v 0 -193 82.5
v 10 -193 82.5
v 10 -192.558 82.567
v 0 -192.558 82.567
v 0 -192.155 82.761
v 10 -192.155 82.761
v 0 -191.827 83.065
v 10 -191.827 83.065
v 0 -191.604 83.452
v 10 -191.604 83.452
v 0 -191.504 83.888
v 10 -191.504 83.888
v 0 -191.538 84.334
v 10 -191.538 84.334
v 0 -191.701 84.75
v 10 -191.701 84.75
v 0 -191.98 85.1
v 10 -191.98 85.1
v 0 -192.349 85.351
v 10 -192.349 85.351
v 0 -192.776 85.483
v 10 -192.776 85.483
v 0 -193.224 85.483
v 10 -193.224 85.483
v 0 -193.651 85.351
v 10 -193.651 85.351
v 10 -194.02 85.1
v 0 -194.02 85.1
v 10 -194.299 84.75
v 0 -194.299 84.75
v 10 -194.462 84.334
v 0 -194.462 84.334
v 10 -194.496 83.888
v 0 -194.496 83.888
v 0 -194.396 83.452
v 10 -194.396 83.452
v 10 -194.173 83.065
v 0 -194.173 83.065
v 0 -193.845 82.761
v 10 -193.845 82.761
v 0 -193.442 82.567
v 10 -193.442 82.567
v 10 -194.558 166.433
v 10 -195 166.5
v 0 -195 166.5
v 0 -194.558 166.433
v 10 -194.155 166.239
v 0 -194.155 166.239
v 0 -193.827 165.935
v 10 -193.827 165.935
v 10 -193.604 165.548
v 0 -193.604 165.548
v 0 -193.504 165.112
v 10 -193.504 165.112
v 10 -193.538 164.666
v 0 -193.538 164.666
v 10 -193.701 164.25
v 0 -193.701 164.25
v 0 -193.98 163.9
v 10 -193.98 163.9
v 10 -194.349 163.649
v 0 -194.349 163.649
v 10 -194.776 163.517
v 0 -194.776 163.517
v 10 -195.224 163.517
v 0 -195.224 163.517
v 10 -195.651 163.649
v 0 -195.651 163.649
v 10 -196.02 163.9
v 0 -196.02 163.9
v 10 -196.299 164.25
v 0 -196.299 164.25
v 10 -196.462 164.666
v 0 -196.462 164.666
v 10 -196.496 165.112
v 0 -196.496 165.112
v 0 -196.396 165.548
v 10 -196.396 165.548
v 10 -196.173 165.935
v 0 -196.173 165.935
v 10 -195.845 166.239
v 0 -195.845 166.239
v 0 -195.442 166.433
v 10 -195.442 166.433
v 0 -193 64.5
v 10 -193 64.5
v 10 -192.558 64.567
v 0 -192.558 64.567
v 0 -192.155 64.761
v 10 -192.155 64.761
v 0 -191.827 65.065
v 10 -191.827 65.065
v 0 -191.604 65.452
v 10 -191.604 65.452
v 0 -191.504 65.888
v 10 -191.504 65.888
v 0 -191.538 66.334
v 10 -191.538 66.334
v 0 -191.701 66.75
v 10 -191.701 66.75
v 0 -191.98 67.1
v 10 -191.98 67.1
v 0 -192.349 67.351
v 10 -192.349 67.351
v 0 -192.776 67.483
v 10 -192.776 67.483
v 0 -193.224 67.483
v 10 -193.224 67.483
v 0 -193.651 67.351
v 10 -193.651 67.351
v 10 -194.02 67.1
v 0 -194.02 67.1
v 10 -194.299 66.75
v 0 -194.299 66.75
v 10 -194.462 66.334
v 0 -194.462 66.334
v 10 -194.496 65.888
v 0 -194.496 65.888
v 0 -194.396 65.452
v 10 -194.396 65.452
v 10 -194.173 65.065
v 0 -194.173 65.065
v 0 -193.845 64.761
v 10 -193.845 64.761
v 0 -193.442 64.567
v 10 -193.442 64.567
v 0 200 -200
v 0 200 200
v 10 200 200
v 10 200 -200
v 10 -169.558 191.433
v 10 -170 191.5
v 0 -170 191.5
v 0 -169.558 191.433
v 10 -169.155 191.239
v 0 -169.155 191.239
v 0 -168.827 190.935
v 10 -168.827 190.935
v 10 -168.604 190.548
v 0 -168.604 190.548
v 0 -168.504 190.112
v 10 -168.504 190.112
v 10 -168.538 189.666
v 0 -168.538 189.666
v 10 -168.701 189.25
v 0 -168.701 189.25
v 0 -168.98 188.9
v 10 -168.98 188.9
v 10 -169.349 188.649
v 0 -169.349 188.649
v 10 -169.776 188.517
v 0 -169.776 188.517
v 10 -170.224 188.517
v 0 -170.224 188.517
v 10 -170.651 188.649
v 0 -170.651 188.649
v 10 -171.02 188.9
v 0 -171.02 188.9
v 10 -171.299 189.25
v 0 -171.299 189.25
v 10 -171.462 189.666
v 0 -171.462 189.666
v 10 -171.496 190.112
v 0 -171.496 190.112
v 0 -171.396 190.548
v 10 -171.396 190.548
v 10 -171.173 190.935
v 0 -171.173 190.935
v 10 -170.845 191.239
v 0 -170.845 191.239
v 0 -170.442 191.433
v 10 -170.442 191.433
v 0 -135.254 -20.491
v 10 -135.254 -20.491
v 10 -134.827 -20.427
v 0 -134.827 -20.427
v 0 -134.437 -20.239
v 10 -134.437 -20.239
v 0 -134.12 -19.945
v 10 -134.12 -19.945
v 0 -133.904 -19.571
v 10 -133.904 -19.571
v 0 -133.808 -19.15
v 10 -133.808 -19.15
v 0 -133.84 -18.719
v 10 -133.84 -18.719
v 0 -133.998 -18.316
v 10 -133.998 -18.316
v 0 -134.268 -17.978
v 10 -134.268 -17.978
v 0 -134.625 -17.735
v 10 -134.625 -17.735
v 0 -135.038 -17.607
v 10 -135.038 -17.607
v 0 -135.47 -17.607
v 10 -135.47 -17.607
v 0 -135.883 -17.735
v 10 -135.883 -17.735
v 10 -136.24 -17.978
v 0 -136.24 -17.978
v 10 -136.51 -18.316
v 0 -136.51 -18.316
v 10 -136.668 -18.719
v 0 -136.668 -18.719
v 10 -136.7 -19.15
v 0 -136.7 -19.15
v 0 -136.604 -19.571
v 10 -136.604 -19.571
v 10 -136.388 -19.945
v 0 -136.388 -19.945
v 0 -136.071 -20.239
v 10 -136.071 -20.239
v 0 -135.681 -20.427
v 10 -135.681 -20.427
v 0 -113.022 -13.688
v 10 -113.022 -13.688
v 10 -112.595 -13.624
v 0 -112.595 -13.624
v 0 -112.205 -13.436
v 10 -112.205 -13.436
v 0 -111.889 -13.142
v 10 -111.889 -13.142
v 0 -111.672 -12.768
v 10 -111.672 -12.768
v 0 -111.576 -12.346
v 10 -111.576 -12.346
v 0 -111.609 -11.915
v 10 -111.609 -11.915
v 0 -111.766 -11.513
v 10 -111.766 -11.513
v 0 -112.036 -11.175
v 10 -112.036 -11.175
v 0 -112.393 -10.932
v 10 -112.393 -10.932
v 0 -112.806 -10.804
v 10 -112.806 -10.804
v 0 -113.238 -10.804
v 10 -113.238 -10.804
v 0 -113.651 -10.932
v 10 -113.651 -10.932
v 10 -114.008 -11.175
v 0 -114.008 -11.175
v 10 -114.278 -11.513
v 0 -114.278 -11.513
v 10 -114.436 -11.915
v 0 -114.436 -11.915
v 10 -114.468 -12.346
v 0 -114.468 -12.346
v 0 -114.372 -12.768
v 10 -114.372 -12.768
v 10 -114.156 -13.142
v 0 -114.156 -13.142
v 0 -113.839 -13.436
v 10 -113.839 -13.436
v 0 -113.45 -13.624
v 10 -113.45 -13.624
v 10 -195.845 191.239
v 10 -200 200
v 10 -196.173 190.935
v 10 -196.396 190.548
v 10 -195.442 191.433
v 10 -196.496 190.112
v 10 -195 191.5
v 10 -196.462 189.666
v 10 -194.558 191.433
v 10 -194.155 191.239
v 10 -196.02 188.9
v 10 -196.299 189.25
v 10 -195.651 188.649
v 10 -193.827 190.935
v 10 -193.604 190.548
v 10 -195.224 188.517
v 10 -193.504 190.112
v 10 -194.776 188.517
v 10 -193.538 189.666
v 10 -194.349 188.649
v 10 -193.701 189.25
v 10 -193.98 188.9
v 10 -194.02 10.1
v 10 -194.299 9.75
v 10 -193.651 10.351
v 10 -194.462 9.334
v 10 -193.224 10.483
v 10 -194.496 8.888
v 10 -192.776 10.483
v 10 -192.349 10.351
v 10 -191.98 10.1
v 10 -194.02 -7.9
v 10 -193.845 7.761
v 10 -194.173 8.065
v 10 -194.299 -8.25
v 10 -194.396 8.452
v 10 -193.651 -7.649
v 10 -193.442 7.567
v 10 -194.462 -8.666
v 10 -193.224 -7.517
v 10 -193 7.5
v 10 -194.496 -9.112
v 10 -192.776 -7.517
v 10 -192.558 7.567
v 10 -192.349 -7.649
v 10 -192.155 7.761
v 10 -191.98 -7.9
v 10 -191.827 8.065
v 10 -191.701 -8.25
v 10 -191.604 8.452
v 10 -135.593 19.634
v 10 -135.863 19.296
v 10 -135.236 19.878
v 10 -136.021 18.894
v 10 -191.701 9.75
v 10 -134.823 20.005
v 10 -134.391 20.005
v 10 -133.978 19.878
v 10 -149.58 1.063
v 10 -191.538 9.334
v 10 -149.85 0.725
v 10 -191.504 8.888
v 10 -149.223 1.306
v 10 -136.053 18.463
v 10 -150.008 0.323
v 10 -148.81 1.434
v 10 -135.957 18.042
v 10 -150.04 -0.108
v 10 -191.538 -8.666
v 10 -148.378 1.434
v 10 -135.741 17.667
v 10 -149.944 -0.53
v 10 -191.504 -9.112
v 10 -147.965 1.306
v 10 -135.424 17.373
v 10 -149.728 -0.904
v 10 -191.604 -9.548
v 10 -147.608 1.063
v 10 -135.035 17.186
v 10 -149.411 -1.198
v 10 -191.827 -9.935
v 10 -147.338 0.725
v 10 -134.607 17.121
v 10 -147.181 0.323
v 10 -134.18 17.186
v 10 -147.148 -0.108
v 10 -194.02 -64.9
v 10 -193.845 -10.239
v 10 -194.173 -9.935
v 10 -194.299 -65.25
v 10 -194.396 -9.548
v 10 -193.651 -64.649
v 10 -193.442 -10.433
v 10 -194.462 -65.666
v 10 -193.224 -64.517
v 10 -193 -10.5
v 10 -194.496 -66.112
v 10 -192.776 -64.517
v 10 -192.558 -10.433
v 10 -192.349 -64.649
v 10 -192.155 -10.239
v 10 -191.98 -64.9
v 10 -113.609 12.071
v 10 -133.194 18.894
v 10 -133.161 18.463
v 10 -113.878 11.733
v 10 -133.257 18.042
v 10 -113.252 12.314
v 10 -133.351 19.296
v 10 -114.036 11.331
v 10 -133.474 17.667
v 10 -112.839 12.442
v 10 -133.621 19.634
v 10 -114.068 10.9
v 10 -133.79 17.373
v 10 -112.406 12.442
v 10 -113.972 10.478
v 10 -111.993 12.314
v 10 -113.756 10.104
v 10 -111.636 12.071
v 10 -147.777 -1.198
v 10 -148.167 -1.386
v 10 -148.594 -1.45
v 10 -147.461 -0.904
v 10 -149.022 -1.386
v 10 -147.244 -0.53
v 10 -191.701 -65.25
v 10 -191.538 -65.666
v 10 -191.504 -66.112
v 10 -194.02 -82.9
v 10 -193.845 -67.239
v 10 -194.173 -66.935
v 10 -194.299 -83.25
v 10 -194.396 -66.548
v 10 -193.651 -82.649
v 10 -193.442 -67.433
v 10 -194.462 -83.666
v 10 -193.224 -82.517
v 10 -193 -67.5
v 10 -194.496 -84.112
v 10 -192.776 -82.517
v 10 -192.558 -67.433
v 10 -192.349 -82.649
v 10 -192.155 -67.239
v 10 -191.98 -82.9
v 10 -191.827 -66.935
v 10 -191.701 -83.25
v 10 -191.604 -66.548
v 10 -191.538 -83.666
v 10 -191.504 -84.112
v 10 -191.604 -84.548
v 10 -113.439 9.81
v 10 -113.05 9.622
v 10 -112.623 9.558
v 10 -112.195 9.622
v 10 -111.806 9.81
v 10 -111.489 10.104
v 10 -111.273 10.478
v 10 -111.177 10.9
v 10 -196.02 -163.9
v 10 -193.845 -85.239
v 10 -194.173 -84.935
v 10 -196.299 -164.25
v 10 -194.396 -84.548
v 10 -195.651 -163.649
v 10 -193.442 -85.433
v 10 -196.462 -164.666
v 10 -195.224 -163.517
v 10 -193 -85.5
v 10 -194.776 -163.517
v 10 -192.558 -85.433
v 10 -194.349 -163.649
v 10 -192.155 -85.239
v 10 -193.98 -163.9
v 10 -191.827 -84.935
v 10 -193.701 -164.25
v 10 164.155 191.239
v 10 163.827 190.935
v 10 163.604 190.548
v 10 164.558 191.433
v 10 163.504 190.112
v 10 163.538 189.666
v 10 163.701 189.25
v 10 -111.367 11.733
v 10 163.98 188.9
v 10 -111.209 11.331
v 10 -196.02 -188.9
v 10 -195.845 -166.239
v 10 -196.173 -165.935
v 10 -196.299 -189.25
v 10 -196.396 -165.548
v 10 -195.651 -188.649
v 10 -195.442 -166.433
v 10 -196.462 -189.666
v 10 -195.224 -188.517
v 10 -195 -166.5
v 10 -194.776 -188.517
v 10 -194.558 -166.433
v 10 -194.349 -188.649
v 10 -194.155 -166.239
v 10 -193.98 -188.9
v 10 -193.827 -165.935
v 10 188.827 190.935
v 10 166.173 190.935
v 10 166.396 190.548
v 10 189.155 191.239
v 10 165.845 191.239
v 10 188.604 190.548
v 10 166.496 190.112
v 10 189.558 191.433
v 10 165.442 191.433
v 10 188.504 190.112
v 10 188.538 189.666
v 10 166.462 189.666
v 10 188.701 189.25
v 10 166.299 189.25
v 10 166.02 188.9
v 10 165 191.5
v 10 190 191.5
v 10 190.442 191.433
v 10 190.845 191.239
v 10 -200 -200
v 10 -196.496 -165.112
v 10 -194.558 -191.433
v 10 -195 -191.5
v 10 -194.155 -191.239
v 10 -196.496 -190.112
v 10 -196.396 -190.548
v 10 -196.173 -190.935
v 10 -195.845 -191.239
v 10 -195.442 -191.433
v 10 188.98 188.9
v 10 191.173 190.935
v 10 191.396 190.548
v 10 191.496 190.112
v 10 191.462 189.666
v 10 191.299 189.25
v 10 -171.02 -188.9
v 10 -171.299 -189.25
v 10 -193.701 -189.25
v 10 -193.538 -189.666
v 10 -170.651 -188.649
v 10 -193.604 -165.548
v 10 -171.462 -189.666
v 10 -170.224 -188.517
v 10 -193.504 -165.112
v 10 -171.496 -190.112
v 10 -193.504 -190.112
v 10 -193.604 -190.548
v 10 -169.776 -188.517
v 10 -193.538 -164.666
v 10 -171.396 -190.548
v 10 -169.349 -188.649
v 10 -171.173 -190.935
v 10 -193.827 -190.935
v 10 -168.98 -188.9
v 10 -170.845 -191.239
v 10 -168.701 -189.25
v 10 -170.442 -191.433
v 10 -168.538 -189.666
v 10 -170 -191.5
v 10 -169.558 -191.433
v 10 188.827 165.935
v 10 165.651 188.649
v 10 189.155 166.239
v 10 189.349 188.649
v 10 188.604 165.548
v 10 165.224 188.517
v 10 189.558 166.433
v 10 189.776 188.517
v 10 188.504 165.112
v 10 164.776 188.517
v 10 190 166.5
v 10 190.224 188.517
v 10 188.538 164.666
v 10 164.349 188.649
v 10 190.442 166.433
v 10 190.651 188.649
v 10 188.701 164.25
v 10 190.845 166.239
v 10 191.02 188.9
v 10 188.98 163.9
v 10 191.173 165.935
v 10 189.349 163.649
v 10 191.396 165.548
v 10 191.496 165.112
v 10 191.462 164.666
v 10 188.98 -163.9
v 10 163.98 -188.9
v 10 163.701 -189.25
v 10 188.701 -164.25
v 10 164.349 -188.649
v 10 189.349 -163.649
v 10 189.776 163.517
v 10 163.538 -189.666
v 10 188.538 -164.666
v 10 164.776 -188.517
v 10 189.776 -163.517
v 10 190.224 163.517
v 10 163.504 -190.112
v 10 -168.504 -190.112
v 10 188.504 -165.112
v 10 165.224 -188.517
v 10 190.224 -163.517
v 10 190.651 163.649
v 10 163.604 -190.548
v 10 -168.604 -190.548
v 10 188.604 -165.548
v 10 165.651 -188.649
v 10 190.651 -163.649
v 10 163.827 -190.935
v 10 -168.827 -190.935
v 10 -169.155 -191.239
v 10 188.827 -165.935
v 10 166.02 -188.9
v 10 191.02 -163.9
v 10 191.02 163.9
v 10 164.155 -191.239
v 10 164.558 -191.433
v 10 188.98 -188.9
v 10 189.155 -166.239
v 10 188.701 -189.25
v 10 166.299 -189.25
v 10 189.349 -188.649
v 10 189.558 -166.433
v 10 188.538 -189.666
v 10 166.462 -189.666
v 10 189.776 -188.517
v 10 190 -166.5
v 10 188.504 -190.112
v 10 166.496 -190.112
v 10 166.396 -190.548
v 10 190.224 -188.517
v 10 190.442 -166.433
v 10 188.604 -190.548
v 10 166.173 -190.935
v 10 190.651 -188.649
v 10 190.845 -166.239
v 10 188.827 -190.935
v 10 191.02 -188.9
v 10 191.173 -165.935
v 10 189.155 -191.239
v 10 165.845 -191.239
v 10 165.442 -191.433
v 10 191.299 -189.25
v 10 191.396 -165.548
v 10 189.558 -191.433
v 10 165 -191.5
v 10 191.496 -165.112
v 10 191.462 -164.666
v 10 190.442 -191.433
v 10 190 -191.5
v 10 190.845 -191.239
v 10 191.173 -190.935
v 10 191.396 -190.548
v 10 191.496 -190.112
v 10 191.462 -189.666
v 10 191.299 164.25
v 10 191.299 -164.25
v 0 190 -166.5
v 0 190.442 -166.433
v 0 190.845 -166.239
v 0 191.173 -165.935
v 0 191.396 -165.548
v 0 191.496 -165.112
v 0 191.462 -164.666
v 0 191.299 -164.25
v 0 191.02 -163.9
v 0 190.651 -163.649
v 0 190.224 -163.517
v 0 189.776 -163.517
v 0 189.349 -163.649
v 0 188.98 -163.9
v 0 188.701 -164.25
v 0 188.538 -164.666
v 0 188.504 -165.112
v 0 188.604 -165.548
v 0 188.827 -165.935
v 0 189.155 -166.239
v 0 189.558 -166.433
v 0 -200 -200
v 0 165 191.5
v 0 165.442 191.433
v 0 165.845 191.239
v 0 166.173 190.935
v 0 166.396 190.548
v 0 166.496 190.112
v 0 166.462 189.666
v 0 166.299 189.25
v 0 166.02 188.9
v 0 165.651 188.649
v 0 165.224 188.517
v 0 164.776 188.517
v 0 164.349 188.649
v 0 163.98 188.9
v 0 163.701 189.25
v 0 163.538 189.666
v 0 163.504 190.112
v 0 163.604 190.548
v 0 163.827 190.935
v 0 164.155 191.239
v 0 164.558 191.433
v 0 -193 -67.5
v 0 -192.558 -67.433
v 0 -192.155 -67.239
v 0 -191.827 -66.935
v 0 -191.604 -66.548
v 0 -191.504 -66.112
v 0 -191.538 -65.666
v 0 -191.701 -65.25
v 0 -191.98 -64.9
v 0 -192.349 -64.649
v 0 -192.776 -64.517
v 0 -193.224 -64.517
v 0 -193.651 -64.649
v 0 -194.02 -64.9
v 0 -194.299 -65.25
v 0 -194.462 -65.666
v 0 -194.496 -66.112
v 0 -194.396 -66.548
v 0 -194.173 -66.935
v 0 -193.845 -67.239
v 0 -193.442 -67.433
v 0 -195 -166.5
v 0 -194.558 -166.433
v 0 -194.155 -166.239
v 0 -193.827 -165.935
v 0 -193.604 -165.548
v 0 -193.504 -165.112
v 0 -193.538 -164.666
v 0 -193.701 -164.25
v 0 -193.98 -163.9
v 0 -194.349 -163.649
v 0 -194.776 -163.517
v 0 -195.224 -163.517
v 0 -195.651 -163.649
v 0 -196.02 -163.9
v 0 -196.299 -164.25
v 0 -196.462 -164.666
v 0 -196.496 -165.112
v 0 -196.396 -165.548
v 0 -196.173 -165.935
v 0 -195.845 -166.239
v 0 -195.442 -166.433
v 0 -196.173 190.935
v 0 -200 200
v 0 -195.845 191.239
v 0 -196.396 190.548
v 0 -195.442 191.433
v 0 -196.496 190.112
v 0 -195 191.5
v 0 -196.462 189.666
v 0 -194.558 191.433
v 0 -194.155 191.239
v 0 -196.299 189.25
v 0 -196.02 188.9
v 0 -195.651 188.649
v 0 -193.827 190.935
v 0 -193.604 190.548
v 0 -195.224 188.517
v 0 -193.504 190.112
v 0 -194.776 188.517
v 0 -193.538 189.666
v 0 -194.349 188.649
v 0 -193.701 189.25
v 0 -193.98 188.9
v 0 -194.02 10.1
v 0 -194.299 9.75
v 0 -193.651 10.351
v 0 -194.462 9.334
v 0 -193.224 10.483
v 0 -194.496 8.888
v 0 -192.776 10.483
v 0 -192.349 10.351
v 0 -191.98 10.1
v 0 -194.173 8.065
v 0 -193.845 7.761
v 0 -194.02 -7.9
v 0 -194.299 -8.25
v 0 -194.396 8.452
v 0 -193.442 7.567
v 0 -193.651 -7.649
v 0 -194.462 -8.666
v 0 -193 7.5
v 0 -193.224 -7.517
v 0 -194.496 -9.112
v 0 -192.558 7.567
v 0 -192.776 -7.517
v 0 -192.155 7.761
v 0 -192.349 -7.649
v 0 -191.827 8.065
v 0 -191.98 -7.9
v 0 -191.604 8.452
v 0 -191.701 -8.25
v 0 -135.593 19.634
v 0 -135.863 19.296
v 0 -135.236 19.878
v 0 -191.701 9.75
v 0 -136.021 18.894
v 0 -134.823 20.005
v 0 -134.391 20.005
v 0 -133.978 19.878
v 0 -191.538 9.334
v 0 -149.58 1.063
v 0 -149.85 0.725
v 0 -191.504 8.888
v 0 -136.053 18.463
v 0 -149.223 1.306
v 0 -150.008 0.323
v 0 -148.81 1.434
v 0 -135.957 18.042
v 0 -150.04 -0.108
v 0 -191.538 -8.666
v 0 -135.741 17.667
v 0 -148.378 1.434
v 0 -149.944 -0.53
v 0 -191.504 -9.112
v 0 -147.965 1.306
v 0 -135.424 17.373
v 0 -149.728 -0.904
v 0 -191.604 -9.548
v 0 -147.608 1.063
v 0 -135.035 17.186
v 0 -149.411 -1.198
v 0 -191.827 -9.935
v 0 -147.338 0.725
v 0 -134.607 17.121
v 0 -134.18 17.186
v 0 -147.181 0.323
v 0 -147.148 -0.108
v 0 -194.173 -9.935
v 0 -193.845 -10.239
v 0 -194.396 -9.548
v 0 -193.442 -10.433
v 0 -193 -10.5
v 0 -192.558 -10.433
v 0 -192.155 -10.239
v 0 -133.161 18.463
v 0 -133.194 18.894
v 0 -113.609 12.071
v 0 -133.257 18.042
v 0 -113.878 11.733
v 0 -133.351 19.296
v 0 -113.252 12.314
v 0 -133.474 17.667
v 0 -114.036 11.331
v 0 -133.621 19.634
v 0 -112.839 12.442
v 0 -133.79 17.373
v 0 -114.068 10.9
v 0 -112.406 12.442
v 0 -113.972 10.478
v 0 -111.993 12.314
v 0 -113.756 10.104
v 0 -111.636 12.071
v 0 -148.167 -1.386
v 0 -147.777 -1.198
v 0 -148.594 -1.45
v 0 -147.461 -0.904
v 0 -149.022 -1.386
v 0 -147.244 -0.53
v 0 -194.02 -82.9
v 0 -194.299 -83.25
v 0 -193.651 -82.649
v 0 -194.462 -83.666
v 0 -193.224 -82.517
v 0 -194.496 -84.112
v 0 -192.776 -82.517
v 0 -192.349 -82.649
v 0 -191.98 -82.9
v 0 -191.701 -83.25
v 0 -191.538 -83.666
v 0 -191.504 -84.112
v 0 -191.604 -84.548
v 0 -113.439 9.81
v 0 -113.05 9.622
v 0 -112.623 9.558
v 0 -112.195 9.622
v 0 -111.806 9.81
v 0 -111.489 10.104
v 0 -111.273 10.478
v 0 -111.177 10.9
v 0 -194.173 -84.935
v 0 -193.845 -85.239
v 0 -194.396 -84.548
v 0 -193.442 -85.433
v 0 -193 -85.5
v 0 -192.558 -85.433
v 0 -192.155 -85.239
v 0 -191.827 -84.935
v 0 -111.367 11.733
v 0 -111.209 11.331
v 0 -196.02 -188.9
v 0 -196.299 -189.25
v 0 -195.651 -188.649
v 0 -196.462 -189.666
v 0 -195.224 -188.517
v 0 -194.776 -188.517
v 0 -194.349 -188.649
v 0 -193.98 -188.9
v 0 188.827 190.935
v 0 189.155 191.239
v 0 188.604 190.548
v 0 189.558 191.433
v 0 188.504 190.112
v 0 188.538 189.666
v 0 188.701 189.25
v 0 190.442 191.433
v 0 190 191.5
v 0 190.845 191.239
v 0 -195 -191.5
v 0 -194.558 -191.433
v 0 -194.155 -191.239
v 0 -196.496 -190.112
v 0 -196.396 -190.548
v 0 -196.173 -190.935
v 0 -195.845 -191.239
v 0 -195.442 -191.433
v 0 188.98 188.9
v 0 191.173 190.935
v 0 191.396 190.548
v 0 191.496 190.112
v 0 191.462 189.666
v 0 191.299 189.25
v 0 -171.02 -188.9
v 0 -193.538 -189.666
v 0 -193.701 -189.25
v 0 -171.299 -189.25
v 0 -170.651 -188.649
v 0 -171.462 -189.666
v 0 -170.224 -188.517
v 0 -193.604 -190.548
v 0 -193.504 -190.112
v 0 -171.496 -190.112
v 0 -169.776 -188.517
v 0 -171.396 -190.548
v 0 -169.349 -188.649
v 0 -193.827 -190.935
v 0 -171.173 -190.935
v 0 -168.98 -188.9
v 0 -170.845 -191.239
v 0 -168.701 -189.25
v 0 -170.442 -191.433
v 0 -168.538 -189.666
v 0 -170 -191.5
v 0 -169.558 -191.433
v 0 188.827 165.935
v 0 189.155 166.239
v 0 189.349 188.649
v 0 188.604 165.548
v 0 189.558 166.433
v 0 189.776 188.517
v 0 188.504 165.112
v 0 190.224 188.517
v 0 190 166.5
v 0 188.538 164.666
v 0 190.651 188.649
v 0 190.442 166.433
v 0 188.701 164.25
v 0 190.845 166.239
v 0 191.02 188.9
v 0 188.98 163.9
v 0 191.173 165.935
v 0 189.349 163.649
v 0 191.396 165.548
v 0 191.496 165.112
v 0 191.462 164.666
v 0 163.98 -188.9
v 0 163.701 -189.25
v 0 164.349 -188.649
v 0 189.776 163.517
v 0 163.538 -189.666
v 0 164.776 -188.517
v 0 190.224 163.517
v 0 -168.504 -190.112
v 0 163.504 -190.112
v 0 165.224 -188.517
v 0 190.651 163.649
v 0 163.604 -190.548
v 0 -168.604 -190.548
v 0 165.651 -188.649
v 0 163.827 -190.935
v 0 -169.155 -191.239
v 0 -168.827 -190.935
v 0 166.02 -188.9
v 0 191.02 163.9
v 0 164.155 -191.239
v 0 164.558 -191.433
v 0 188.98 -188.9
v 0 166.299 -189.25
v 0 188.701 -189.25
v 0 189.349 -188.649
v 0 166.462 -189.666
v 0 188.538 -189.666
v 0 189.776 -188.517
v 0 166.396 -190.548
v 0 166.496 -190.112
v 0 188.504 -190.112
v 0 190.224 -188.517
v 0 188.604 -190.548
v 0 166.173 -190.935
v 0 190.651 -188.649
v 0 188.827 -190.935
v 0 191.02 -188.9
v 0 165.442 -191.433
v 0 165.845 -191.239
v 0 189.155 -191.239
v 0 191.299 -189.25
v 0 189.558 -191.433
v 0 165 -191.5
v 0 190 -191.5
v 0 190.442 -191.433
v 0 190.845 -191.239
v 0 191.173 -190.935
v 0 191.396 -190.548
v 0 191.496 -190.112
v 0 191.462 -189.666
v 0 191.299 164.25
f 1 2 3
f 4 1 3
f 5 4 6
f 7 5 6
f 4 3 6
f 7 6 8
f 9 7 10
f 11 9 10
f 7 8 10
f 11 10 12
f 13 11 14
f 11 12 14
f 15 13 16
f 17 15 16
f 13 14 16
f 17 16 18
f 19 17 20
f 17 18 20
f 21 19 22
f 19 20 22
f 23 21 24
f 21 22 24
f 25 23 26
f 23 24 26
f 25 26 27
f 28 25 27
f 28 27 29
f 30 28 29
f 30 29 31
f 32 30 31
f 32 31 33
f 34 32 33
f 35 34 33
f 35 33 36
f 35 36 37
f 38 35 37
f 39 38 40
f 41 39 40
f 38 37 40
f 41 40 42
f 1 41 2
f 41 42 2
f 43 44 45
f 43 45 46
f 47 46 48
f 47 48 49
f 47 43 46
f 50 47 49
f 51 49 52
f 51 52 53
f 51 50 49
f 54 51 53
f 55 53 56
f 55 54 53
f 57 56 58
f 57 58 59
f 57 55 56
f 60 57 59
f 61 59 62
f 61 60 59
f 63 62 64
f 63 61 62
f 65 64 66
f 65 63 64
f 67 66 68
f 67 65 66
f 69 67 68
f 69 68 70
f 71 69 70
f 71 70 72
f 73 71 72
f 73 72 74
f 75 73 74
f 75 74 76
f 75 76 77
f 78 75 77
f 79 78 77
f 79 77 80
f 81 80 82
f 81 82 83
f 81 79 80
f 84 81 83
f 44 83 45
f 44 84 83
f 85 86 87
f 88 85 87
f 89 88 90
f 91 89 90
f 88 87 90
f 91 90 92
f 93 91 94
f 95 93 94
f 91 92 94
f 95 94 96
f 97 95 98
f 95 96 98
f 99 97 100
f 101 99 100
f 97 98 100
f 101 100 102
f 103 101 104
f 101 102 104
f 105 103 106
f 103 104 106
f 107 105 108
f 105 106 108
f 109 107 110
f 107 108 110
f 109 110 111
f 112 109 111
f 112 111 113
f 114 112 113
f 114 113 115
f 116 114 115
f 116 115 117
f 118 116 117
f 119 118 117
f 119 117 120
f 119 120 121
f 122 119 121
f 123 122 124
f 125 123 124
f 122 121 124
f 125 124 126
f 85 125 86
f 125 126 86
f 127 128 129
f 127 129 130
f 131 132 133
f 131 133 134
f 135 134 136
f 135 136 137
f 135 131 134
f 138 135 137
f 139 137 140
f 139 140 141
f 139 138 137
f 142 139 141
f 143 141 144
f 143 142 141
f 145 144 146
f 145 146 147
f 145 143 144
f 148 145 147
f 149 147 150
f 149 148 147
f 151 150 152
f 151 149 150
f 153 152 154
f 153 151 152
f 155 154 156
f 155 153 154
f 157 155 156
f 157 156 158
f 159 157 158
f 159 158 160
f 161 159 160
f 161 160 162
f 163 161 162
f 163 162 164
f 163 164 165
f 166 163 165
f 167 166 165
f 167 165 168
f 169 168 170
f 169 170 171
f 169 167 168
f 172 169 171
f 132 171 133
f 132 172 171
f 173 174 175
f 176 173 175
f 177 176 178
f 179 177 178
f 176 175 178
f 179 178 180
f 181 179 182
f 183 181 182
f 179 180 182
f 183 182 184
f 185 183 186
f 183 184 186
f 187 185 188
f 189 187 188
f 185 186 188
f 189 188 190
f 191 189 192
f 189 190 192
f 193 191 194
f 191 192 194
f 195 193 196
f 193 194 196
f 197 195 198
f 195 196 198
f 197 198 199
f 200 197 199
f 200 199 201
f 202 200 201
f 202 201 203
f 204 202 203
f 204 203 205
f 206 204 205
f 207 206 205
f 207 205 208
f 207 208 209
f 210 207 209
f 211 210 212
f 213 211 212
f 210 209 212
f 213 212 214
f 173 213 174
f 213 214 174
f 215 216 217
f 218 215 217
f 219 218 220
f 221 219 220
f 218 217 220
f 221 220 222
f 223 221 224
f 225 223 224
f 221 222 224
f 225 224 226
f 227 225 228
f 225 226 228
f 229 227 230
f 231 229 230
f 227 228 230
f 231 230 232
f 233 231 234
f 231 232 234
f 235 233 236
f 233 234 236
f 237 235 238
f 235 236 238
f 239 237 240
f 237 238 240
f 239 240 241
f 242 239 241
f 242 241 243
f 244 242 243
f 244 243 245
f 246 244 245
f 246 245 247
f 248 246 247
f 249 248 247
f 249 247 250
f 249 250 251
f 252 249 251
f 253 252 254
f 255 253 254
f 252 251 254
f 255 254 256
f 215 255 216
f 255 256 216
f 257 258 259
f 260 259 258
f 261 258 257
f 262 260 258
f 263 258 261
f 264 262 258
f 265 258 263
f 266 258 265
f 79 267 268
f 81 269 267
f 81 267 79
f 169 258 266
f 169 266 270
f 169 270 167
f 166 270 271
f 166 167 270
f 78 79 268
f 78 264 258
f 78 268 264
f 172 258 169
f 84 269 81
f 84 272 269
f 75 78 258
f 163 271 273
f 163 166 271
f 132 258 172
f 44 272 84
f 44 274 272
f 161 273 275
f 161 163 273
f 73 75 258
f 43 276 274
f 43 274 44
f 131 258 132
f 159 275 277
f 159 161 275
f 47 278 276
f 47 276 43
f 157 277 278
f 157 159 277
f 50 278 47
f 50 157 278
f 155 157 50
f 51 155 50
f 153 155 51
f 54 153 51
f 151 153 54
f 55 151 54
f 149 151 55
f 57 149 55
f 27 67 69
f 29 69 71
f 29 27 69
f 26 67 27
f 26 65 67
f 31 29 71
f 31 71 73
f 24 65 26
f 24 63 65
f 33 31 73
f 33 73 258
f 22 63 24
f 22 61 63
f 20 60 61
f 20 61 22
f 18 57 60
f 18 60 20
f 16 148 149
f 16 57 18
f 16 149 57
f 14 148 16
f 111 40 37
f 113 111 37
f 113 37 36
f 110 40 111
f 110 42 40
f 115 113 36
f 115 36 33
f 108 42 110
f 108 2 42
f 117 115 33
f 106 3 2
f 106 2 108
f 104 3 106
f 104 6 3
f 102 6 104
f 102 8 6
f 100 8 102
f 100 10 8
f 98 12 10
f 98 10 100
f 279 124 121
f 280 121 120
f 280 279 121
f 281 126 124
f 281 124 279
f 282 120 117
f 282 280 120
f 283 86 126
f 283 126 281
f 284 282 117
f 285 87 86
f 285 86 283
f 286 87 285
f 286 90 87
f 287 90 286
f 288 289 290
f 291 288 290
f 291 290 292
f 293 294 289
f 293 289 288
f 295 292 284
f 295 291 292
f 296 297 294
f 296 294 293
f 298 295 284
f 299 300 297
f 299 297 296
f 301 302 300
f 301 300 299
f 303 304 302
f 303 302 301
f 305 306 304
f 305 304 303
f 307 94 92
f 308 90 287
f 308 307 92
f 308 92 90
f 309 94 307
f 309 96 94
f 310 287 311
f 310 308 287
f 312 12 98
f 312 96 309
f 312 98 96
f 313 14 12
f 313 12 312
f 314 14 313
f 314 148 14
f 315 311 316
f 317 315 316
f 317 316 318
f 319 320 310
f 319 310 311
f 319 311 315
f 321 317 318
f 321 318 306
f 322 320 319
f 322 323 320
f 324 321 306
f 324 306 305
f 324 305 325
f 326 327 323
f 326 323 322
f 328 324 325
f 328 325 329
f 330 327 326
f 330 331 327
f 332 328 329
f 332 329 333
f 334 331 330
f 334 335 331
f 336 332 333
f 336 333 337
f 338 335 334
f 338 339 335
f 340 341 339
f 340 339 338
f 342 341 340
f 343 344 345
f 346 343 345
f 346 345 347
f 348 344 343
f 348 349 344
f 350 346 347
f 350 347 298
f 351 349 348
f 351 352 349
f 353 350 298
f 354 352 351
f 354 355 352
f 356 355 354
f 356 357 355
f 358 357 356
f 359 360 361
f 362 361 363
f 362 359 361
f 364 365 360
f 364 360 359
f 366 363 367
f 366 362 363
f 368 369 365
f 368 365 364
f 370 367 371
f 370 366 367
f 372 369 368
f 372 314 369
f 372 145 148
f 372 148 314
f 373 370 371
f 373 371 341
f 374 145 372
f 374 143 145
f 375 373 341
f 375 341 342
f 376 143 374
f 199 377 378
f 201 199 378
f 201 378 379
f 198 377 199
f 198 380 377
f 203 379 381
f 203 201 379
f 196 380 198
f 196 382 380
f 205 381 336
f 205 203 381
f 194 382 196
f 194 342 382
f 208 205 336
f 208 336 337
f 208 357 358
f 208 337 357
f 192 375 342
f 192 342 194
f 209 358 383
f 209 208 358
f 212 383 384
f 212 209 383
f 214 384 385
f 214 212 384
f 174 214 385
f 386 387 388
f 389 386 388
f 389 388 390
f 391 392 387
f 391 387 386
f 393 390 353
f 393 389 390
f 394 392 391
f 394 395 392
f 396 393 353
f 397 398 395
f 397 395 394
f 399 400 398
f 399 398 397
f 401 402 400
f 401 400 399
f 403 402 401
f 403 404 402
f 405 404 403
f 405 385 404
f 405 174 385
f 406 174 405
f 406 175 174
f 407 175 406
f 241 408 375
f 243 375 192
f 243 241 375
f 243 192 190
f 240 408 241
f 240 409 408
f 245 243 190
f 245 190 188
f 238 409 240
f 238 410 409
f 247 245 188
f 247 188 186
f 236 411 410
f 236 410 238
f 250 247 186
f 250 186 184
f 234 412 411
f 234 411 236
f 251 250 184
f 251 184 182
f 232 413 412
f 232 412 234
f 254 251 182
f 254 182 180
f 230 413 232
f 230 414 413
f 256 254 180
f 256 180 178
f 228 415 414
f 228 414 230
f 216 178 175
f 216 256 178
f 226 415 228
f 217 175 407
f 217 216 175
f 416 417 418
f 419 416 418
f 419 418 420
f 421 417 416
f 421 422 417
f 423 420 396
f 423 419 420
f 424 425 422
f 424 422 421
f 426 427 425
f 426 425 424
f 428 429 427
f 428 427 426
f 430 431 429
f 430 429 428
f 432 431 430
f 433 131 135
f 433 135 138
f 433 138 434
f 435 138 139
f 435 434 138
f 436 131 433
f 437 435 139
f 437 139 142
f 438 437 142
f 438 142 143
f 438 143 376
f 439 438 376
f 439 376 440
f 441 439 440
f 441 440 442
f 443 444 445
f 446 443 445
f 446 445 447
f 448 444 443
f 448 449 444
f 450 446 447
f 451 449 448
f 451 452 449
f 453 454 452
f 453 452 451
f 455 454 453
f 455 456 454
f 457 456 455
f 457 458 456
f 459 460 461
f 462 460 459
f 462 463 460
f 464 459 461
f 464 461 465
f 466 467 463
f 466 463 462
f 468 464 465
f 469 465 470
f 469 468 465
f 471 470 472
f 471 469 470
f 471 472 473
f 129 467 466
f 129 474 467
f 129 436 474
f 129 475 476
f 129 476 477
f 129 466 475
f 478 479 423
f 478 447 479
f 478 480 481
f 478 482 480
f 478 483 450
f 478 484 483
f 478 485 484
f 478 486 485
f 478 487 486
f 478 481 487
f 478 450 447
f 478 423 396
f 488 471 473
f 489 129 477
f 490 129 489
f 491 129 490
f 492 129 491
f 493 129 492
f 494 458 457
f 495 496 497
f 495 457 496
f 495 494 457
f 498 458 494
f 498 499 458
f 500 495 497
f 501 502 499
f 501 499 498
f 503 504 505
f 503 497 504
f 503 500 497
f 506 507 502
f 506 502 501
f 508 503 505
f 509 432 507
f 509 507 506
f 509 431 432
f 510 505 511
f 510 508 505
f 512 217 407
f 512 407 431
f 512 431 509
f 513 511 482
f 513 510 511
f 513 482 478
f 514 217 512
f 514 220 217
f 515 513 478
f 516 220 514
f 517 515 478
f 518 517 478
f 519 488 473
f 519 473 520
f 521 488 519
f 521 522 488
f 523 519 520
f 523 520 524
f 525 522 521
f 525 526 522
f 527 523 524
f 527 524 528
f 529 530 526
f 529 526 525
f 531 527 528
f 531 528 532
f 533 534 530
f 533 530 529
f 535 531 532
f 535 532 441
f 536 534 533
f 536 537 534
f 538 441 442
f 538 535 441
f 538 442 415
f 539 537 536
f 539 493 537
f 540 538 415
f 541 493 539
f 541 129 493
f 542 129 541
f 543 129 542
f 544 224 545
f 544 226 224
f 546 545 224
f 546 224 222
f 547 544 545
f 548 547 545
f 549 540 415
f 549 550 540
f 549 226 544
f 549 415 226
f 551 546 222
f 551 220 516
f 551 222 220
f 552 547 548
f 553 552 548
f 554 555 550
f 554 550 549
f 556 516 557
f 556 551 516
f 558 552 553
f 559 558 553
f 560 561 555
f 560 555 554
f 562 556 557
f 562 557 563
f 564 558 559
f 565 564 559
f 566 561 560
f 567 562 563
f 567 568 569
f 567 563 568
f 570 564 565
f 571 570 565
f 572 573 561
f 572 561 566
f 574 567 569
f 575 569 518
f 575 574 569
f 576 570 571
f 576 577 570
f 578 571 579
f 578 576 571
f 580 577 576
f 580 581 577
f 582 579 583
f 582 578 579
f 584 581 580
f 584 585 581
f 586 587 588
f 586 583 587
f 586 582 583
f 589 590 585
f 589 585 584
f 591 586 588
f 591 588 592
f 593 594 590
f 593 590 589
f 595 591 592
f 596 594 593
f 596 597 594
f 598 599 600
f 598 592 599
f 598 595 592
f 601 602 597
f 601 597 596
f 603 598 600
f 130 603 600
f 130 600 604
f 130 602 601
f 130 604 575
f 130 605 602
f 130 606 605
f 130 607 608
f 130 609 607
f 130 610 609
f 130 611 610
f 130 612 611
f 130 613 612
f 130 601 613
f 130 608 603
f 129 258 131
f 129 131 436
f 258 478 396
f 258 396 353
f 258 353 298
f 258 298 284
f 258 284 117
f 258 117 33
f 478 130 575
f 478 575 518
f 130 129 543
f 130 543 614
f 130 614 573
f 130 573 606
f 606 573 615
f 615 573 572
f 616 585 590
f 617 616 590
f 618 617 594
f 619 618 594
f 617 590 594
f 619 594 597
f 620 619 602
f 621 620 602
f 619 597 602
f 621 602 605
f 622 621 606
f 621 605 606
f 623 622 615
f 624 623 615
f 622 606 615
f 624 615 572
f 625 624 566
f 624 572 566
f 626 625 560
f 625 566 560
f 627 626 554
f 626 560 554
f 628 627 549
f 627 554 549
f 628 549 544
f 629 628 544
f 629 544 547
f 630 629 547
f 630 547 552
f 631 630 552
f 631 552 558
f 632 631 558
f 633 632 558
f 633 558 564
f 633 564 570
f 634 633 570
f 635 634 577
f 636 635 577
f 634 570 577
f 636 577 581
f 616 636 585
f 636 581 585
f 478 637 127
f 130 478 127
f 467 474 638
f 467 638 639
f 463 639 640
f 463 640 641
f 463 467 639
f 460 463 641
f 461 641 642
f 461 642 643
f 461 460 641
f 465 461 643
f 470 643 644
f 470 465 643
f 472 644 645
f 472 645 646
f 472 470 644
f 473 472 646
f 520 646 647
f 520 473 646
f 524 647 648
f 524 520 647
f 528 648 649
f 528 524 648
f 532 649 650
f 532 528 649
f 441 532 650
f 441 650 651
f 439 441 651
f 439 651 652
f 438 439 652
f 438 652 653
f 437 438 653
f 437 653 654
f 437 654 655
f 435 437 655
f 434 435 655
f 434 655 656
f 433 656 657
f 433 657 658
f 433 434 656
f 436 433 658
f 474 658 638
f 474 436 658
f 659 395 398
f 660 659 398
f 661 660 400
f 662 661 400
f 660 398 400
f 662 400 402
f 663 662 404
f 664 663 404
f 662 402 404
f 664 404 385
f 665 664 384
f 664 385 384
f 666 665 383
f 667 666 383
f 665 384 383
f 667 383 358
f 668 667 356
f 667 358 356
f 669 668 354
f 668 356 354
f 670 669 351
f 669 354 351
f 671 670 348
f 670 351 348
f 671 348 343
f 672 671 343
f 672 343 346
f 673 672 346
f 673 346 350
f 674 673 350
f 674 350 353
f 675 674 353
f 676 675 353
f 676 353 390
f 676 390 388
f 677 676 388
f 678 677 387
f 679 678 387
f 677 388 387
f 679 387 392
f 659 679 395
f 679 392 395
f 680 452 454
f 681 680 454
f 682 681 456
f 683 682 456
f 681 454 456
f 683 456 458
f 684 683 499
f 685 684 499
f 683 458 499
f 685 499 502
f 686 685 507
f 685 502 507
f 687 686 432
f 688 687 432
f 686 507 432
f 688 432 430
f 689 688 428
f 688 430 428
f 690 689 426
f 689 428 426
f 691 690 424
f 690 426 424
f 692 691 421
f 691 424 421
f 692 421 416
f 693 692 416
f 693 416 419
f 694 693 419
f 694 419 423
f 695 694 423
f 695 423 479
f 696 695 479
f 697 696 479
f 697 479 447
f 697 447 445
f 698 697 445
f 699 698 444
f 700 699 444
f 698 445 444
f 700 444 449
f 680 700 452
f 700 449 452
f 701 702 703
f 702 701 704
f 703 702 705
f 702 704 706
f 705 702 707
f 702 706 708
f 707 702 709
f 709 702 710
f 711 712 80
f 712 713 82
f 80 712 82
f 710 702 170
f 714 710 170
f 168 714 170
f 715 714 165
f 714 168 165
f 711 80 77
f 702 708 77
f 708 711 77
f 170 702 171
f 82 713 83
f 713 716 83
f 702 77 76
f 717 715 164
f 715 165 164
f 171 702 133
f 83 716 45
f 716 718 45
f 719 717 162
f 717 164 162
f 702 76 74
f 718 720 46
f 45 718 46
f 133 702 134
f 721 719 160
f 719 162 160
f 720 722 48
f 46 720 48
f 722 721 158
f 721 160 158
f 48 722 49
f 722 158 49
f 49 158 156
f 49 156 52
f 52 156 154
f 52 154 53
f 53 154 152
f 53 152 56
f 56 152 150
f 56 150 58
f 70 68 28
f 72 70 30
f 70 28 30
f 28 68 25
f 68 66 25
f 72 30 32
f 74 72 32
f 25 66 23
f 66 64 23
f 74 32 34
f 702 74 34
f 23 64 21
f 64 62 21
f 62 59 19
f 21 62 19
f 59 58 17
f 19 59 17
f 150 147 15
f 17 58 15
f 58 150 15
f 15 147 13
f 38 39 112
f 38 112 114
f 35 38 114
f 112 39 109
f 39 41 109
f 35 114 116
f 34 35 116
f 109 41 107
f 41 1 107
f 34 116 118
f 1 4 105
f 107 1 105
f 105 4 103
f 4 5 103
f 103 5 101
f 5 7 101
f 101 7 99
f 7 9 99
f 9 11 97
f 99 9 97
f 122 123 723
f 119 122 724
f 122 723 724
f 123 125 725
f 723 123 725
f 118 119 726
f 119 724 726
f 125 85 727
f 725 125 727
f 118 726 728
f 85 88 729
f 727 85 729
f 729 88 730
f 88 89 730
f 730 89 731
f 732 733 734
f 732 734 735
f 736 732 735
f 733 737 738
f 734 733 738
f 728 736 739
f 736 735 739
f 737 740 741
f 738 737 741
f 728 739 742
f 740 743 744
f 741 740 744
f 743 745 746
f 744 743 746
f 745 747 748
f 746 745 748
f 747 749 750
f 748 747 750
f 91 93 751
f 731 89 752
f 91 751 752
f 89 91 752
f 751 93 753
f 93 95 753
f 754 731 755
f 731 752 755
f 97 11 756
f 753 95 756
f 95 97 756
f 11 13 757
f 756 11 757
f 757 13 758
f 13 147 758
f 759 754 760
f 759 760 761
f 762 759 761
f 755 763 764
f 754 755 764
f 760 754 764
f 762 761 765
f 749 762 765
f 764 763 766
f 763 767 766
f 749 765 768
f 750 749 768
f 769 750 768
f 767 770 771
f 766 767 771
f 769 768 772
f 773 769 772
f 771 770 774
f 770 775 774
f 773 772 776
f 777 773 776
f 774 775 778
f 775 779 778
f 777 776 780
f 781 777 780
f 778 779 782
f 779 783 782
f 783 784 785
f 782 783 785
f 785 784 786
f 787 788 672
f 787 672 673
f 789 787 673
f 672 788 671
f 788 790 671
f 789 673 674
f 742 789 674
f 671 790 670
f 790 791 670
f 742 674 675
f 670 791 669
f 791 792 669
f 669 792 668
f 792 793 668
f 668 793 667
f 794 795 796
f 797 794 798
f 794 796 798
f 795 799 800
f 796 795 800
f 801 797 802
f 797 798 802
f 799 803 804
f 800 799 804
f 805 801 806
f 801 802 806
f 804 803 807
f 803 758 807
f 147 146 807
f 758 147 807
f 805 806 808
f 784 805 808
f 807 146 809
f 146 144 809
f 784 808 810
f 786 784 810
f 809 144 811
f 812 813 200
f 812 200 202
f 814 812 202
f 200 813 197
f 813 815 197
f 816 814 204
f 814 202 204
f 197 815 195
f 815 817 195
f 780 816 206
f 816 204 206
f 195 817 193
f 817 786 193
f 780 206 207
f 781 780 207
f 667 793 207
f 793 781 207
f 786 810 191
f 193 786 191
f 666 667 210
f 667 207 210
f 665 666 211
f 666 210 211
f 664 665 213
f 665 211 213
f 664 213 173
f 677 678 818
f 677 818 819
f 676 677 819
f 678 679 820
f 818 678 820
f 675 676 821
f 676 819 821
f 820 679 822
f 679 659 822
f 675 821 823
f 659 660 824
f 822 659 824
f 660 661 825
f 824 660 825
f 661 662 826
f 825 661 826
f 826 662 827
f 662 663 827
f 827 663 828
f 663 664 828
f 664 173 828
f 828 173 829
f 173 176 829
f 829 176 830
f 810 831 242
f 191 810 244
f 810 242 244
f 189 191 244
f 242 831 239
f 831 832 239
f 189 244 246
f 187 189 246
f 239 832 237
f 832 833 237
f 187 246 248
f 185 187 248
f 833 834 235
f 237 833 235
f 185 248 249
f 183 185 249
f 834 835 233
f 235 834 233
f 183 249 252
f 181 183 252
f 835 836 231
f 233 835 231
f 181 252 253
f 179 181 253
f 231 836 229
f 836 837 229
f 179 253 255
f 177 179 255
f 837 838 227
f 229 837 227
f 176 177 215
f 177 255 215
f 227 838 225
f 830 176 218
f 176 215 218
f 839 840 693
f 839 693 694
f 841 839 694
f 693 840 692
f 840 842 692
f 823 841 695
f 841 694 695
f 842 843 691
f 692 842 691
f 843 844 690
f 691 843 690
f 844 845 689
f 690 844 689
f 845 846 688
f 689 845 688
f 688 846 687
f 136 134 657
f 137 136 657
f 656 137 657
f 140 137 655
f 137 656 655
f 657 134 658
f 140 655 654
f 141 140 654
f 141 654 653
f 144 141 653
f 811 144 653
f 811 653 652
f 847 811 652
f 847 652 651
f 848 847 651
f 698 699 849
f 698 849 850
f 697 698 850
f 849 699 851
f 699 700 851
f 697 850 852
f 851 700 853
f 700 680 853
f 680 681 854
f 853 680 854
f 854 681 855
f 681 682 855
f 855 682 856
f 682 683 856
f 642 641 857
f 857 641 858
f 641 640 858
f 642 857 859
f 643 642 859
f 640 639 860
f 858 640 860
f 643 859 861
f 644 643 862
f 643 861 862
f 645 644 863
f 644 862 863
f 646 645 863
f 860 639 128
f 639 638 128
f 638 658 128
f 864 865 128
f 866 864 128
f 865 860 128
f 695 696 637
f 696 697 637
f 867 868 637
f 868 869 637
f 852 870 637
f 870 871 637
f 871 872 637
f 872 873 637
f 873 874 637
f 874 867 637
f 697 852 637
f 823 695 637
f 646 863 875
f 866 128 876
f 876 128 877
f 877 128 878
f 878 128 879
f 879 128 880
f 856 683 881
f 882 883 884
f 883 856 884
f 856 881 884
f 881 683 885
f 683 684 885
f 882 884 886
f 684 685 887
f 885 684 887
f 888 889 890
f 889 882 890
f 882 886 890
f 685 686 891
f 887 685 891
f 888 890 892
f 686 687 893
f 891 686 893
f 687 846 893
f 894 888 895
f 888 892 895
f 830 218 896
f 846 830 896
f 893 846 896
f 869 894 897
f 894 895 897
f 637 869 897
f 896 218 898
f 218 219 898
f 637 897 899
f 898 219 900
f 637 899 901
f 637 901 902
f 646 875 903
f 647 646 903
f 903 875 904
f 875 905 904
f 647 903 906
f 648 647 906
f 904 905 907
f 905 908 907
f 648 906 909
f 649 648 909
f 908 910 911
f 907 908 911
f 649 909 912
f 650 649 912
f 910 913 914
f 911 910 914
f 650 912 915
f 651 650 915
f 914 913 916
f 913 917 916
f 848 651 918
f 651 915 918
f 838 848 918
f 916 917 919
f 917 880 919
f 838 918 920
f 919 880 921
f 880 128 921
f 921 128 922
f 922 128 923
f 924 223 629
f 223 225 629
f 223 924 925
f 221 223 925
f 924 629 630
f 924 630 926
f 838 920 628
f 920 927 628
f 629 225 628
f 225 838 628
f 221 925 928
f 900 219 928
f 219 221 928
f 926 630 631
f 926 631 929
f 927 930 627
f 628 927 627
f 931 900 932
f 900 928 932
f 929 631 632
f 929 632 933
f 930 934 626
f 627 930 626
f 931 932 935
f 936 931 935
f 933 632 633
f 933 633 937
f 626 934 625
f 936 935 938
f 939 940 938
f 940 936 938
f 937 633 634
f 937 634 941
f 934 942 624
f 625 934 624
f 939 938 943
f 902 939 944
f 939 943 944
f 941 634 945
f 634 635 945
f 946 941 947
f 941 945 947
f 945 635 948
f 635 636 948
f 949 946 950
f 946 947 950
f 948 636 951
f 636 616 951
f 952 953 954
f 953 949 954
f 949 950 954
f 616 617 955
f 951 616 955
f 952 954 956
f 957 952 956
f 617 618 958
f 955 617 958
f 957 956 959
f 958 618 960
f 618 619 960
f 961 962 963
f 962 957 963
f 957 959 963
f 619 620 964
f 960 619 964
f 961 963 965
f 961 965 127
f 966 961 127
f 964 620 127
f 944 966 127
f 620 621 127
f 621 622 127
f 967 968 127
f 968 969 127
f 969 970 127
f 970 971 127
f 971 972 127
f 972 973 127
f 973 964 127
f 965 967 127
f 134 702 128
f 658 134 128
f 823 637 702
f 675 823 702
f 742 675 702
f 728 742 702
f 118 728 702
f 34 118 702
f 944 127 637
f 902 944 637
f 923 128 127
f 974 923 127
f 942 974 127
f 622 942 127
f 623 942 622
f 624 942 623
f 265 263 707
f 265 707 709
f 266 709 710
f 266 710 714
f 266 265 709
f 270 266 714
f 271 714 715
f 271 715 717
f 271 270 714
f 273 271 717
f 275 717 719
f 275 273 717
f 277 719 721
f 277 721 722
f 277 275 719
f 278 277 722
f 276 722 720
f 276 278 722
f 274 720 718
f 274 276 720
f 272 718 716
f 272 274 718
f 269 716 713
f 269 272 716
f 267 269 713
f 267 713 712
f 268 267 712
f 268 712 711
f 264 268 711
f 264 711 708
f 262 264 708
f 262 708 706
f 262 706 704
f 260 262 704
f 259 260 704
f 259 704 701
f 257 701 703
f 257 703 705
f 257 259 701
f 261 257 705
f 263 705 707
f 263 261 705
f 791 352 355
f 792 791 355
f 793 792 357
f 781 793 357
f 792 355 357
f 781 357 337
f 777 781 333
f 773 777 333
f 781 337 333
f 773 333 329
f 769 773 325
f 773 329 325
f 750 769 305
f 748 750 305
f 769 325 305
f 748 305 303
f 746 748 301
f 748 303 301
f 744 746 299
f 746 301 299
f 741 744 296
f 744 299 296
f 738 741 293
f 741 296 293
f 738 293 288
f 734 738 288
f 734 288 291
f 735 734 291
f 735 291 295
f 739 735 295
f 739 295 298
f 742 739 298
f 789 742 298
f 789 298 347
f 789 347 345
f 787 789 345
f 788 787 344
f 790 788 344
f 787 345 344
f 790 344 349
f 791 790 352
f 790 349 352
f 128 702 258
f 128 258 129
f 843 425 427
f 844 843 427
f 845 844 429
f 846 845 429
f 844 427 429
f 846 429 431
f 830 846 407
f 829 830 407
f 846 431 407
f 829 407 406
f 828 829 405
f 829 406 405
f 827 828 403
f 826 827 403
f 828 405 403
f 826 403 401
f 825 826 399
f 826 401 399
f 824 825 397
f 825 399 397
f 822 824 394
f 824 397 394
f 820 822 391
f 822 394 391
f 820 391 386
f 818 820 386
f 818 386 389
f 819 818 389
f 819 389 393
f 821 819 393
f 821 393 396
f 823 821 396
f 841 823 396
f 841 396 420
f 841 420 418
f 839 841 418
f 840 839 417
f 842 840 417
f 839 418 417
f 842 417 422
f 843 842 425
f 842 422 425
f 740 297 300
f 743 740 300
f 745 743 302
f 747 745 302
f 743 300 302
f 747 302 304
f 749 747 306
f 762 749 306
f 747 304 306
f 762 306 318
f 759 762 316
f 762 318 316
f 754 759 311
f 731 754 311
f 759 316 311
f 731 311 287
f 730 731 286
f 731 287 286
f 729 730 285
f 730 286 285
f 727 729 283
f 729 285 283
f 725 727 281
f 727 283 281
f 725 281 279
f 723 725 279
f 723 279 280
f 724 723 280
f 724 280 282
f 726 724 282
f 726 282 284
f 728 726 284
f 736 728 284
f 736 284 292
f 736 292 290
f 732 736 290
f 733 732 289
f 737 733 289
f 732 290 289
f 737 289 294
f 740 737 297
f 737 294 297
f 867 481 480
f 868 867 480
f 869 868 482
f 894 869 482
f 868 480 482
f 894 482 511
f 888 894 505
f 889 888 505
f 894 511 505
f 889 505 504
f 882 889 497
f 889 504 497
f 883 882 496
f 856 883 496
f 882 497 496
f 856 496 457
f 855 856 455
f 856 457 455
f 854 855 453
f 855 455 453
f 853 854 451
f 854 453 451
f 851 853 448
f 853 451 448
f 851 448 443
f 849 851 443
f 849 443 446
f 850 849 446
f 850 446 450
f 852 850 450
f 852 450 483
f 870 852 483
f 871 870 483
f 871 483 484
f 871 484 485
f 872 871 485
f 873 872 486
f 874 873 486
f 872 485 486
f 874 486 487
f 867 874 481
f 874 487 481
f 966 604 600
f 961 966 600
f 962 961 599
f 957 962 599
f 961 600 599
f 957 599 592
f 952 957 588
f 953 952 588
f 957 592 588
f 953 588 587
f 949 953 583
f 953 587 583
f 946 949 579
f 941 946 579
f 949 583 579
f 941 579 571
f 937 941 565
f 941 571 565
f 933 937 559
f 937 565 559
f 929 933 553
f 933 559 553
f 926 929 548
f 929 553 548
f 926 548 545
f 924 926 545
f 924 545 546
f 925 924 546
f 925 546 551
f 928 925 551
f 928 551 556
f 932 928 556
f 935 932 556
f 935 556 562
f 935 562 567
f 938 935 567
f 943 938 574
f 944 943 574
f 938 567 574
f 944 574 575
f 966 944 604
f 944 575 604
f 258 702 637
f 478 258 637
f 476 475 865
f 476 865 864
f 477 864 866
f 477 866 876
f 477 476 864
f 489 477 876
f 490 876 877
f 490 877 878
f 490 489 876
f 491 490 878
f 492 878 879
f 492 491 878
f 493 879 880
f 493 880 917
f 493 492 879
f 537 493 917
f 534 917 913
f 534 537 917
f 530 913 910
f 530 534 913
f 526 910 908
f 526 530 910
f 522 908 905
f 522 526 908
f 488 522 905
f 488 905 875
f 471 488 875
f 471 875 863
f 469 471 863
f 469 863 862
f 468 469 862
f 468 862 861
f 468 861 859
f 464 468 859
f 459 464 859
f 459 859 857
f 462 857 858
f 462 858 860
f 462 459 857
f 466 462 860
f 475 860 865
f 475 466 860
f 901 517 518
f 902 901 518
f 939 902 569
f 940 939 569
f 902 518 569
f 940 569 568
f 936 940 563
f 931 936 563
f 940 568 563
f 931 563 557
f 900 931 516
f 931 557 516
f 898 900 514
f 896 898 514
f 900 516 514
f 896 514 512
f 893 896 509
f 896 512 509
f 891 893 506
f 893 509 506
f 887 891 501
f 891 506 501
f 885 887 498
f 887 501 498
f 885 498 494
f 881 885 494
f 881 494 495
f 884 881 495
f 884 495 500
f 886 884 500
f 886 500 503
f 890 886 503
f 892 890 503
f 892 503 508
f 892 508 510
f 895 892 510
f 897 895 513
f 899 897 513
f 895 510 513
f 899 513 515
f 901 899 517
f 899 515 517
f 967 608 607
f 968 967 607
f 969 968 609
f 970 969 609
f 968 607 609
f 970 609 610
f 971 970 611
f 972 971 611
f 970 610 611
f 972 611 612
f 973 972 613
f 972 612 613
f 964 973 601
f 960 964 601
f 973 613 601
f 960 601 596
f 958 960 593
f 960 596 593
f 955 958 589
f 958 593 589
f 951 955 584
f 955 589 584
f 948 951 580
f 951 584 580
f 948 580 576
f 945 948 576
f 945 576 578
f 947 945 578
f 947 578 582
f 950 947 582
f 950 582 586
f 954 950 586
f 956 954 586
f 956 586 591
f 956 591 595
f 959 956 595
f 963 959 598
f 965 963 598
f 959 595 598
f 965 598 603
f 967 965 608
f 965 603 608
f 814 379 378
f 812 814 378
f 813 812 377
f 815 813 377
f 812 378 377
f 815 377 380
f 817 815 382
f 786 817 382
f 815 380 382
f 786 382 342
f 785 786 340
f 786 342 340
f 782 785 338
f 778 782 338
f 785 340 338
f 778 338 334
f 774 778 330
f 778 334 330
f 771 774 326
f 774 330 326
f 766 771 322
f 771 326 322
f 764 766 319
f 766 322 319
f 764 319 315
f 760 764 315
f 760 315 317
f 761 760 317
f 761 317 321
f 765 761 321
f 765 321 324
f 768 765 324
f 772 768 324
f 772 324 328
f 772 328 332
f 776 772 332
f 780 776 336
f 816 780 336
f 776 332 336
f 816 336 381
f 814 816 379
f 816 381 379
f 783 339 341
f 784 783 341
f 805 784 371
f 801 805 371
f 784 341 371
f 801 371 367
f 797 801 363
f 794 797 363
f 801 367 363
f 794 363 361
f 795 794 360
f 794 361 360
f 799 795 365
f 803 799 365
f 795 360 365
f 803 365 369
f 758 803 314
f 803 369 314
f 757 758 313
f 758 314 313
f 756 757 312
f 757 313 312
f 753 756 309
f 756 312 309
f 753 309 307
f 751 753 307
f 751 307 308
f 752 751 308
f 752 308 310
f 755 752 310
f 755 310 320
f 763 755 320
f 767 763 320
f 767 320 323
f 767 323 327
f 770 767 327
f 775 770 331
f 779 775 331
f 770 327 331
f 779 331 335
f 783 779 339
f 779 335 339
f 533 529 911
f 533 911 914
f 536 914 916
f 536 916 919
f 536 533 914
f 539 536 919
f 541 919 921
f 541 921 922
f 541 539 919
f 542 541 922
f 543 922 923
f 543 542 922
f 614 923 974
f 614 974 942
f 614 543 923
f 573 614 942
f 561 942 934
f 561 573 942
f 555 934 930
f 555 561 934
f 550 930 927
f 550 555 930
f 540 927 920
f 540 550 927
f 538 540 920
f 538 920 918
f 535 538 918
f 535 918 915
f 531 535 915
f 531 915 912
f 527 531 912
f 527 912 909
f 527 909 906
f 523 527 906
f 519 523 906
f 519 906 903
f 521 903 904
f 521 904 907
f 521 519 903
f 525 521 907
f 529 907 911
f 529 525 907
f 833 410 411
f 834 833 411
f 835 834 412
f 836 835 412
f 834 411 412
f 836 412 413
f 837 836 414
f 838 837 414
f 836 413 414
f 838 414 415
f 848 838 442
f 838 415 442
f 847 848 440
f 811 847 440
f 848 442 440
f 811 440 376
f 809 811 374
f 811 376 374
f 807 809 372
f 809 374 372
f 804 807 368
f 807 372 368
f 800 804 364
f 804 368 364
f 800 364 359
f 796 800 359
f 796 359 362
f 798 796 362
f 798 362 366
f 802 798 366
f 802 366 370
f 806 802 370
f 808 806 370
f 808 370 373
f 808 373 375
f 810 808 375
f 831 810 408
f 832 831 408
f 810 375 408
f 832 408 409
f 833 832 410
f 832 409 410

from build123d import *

# Parameters (mm, degrees)
SKETCH_1_W          = 400
SKETCH_1_H          = 400
EXTRUDE_1_DEPTH     = 10
SKETCH_2_R          = 1.5
CUT_EXTRUDE_1_DEPTH = 10
SKETCH_3_R          = 1.5
CUT_EXTRUDE_2_DEPTH = 10
SKETCH_4_R          = 1.45
CUT_EXTRUDE_3_DEPTH = 10


with BuildPart() as part:
    # 草图1 → 凸台-拉伸1 (new body)
    with BuildSketch(Plane(origin=(0, 0, 0), x_dir=(0, 0, -1), z_dir=(1, 0, 0))):
        Rectangle(SKETCH_1_W, SKETCH_1_H)
    extrude(amount=EXTRUDE_1_DEPTH)

    # 草图2 → 切除-拉伸1 (cut)
    with BuildSketch(Plane(origin=(10, 0, 0), x_dir=(0, 0, -1), z_dir=(1, 0, 0))):
        with Locations((190, 190)):
            Circle(SKETCH_2_R)
        with Locations((165, 190)):
            Circle(SKETCH_2_R)
        with Locations((190, 165)):
            Circle(SKETCH_2_R)
        with Locations((190, -195)):
            Circle(SKETCH_2_R)
        with Locations((165, -195)):
            Circle(SKETCH_2_R)
        with Locations((190, -170)):
            Circle(SKETCH_2_R)
    cut_extrude_1 = extrude(amount=-CUT_EXTRUDE_1_DEPTH, mode=Mode.SUBTRACT)

    # 草图3 → 切除-拉伸2 (cut)
    with BuildSketch(Plane(origin=(10, 0, 0), x_dir=(0, 0, -1), z_dir=(1, 0, 0))):
        with Locations((-84, -193)):
            Circle(SKETCH_3_R)
        with Locations((-66, -193)):
            Circle(SKETCH_3_R)
        with Locations((-9, -193)):
            Circle(SKETCH_3_R)
        with Locations((9, -193)):
            Circle(SKETCH_3_R)
        with Locations((66, -193)):
            Circle(SKETCH_3_R)
        with Locations((84, -193)):
            Circle(SKETCH_3_R)
    extrude(amount=-CUT_EXTRUDE_2_DEPTH, mode=Mode.SUBTRACT)

    # 镜向1: 切除-拉伸1 across plane
    add(cut_extrude_1.mirror(Plane.XY), mode=Mode.SUBTRACT)

    # 草图4 → 切除-拉伸3 (cut)
    with BuildSketch(Plane(origin=(10, 0, 0), x_dir=(0, 0, -1), z_dir=(1, 0, 0))):
        with Locations((-11.007896697, -112.622517601)):
            Circle(SKETCH_4_R)
        with Locations((12.238028253, -113.022211572)):
            Circle(SKETCH_4_R)
        with Locations((-18.571414113, -134.607193773)):
            Circle(SKETCH_4_R)
        with Locations((19.041282557, -135.253912204)):
            Circle(SKETCH_4_R)
        with Locations((0, -148.59416485)):
            Circle(SKETCH_4_R)
    extrude(amount=-CUT_EXTRUDE_3_DEPTH, mode=Mode.SUBTRACT)


solid = part.part
